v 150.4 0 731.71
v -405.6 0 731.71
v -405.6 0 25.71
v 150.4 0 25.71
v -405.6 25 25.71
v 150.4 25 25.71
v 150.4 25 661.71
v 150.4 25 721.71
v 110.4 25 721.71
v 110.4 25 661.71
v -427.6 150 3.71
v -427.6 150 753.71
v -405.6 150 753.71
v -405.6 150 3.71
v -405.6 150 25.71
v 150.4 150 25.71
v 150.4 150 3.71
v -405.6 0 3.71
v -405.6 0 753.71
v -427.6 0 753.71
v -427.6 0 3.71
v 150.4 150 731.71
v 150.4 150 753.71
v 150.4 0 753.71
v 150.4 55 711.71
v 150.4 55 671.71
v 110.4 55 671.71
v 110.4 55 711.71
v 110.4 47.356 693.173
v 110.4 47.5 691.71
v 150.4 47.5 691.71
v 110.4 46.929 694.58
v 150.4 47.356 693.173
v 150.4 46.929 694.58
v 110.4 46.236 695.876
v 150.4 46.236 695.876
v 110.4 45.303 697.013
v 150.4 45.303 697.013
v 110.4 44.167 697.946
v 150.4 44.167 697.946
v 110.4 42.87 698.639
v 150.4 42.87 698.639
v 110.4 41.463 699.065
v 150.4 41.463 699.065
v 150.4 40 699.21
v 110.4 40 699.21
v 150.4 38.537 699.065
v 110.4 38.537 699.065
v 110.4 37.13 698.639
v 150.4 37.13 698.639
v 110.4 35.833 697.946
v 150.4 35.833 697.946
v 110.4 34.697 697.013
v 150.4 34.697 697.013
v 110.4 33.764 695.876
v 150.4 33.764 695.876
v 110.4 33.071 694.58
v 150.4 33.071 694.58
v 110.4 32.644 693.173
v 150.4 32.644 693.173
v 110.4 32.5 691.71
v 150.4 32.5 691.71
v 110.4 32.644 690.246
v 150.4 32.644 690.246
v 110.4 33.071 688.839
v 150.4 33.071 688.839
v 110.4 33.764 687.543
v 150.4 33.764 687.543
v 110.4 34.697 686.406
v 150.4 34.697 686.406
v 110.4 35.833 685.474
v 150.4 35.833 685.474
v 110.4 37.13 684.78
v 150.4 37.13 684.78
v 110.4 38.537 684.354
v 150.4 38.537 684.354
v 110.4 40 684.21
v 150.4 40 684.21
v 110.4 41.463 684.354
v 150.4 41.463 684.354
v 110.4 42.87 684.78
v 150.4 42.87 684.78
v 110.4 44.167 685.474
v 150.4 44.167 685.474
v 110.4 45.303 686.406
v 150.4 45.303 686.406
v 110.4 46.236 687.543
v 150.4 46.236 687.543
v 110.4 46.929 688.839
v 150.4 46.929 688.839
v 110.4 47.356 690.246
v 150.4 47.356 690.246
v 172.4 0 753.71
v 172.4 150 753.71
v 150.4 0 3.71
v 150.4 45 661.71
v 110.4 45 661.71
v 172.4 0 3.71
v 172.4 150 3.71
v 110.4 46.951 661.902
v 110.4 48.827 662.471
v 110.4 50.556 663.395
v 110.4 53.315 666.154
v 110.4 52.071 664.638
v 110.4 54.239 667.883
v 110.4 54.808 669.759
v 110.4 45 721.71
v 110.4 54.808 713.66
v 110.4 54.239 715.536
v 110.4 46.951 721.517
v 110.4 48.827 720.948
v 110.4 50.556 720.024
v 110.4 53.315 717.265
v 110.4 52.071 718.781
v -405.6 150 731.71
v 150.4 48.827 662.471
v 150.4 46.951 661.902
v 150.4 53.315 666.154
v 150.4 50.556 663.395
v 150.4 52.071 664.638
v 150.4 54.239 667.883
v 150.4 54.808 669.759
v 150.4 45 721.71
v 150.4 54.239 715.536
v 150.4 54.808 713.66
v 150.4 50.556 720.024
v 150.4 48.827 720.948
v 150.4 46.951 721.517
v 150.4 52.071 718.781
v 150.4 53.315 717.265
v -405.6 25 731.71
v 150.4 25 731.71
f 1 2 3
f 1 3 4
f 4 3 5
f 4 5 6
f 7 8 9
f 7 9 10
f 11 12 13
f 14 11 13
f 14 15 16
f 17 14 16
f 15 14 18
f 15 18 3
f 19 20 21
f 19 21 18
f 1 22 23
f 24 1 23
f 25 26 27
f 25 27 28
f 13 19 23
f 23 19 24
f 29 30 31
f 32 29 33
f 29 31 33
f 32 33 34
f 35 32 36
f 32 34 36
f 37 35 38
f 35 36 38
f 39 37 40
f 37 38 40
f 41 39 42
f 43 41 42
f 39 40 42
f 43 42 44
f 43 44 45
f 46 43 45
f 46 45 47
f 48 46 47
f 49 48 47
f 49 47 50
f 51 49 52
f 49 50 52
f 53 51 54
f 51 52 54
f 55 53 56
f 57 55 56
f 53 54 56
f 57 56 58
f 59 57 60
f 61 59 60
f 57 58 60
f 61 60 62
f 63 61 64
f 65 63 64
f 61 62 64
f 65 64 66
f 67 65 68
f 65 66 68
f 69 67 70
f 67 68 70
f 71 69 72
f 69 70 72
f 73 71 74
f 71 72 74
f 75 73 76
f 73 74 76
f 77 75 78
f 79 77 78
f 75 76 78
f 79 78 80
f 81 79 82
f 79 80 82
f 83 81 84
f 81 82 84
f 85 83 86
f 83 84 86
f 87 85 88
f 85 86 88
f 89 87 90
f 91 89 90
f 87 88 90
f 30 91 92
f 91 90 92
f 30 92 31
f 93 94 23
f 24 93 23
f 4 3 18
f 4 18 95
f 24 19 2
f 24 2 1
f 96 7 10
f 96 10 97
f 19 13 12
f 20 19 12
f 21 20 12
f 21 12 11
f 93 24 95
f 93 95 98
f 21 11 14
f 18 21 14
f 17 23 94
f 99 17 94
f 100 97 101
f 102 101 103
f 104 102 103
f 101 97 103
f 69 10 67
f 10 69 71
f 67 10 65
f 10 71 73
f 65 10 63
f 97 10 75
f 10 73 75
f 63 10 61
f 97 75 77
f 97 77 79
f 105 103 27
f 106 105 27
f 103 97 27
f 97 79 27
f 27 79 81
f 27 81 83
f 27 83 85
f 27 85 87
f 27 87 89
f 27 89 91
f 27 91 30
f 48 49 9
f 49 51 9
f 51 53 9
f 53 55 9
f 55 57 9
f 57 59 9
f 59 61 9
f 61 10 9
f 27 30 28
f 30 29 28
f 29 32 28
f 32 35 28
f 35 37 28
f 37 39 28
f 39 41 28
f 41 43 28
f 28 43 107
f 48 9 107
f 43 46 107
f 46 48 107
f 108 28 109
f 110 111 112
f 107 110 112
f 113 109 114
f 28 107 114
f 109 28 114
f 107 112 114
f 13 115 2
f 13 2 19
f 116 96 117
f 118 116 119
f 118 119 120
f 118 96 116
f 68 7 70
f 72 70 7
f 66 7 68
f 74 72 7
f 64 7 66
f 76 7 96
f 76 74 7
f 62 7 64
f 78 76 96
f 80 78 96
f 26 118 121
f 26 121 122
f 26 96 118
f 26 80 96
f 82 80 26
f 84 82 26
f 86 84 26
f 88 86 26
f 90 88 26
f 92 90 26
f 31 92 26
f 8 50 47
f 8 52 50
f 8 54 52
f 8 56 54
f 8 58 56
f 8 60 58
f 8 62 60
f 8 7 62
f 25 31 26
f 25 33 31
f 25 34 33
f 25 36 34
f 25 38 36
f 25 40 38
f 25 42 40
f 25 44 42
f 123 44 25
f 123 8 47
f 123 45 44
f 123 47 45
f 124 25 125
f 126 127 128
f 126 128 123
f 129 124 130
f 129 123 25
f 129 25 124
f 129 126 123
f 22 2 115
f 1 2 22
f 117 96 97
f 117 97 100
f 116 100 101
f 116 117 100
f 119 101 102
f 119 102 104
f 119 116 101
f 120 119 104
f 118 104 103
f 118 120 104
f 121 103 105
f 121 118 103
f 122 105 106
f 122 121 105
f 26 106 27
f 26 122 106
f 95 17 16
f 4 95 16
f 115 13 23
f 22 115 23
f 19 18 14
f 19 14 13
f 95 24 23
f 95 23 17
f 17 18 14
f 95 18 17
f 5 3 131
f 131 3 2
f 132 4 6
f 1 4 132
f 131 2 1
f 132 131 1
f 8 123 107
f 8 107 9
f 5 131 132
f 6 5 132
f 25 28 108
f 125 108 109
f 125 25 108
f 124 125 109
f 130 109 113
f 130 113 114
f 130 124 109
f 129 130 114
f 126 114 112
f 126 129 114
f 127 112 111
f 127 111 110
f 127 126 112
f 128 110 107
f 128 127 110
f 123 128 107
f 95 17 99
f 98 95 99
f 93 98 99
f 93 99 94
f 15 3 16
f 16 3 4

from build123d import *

# Parameters (mm, degrees)
F1_DEPTH = 150
F2_DEPTH = 150
F0_W     = 556
F0_H     = 22
F3_DEPTH = 150
F4_DEPTH = 150
F0_H_2   = 706
F5_DEPTH = 25
F6_R     = 7.5
F7_DEPTH = 40


with BuildPart() as f1:
    # F0 (on Front) → F1 (new body)
    with BuildSketch(Plane.XZ):
        Polygon((-405.600094, 753.709539), (-427.600094, 753.709539), (-427.600094, 3.709539), (-405.600094, 3.709539), (-405.600094, 25.709539), (-405.600094, 731.709539), align=None)
    extrude(amount=-F1_DEPTH)


with BuildPart() as f2:
    # F0 (on Front) → F2 (new body)
    with BuildSketch(Plane.XZ):
        Polygon((172.399906, 753.709539), (150.399906, 753.709539), (150.399906, 731.709539), (150.399906, 25.709539), (150.399906, 3.709539), (172.399906, 3.709539), align=None)
    extrude(amount=-F2_DEPTH)


with BuildPart() as f3:
    # F0 (on Front) → F3 (new body)
    with BuildSketch(Plane.XZ):
        with Locations((-127.600094, 742.709539)):
            Rectangle(F0_W, F0_H)
    extrude(amount=-F3_DEPTH)


with BuildPart() as f4:
    # F0 (on Front) → F4 (new body)
    with BuildSketch(Plane.XZ):
        with Locations((-127.600094, 14.709539)):
            Rectangle(F0_W, F0_H)
    extrude(amount=-F4_DEPTH)


with BuildPart() as f5:
    # F0 (on Front) → F5 (new body)
    with BuildSketch(Plane.XZ):
        with Locations((-127.600094, 378.709539)):
            Rectangle(F0_W, F0_H_2)
    extrude(amount=-F5_DEPTH)


with BuildPart() as f7:
    # F6 (on face) → F7 (new body)
    with BuildSketch(Plane.YZ.offset(150.399906)):
        with BuildLine():
            Line((45, 721.709539), (25, 721.709539))
            Line((25, 721.709539), (25, 661.709539))
            Line((25, 661.709539), (45, 661.709539))
            ThreePointArc((45, 661.709539), (52.071068, 664.638471), (55, 671.709539))
            Line((55, 671.709539), (55, 711.709539))
            ThreePointArc((55, 711.709539), (52.071068, 718.780607), (45, 721.709539))
        make_face()
        with Locations((40, 691.709539)):
            Circle(F6_R, mode=Mode.SUBTRACT)
    extrude(amount=-F7_DEPTH)


solid = Compound([f1.part, f2.part, f3.part, f4.part, f5.part, f7.part])
